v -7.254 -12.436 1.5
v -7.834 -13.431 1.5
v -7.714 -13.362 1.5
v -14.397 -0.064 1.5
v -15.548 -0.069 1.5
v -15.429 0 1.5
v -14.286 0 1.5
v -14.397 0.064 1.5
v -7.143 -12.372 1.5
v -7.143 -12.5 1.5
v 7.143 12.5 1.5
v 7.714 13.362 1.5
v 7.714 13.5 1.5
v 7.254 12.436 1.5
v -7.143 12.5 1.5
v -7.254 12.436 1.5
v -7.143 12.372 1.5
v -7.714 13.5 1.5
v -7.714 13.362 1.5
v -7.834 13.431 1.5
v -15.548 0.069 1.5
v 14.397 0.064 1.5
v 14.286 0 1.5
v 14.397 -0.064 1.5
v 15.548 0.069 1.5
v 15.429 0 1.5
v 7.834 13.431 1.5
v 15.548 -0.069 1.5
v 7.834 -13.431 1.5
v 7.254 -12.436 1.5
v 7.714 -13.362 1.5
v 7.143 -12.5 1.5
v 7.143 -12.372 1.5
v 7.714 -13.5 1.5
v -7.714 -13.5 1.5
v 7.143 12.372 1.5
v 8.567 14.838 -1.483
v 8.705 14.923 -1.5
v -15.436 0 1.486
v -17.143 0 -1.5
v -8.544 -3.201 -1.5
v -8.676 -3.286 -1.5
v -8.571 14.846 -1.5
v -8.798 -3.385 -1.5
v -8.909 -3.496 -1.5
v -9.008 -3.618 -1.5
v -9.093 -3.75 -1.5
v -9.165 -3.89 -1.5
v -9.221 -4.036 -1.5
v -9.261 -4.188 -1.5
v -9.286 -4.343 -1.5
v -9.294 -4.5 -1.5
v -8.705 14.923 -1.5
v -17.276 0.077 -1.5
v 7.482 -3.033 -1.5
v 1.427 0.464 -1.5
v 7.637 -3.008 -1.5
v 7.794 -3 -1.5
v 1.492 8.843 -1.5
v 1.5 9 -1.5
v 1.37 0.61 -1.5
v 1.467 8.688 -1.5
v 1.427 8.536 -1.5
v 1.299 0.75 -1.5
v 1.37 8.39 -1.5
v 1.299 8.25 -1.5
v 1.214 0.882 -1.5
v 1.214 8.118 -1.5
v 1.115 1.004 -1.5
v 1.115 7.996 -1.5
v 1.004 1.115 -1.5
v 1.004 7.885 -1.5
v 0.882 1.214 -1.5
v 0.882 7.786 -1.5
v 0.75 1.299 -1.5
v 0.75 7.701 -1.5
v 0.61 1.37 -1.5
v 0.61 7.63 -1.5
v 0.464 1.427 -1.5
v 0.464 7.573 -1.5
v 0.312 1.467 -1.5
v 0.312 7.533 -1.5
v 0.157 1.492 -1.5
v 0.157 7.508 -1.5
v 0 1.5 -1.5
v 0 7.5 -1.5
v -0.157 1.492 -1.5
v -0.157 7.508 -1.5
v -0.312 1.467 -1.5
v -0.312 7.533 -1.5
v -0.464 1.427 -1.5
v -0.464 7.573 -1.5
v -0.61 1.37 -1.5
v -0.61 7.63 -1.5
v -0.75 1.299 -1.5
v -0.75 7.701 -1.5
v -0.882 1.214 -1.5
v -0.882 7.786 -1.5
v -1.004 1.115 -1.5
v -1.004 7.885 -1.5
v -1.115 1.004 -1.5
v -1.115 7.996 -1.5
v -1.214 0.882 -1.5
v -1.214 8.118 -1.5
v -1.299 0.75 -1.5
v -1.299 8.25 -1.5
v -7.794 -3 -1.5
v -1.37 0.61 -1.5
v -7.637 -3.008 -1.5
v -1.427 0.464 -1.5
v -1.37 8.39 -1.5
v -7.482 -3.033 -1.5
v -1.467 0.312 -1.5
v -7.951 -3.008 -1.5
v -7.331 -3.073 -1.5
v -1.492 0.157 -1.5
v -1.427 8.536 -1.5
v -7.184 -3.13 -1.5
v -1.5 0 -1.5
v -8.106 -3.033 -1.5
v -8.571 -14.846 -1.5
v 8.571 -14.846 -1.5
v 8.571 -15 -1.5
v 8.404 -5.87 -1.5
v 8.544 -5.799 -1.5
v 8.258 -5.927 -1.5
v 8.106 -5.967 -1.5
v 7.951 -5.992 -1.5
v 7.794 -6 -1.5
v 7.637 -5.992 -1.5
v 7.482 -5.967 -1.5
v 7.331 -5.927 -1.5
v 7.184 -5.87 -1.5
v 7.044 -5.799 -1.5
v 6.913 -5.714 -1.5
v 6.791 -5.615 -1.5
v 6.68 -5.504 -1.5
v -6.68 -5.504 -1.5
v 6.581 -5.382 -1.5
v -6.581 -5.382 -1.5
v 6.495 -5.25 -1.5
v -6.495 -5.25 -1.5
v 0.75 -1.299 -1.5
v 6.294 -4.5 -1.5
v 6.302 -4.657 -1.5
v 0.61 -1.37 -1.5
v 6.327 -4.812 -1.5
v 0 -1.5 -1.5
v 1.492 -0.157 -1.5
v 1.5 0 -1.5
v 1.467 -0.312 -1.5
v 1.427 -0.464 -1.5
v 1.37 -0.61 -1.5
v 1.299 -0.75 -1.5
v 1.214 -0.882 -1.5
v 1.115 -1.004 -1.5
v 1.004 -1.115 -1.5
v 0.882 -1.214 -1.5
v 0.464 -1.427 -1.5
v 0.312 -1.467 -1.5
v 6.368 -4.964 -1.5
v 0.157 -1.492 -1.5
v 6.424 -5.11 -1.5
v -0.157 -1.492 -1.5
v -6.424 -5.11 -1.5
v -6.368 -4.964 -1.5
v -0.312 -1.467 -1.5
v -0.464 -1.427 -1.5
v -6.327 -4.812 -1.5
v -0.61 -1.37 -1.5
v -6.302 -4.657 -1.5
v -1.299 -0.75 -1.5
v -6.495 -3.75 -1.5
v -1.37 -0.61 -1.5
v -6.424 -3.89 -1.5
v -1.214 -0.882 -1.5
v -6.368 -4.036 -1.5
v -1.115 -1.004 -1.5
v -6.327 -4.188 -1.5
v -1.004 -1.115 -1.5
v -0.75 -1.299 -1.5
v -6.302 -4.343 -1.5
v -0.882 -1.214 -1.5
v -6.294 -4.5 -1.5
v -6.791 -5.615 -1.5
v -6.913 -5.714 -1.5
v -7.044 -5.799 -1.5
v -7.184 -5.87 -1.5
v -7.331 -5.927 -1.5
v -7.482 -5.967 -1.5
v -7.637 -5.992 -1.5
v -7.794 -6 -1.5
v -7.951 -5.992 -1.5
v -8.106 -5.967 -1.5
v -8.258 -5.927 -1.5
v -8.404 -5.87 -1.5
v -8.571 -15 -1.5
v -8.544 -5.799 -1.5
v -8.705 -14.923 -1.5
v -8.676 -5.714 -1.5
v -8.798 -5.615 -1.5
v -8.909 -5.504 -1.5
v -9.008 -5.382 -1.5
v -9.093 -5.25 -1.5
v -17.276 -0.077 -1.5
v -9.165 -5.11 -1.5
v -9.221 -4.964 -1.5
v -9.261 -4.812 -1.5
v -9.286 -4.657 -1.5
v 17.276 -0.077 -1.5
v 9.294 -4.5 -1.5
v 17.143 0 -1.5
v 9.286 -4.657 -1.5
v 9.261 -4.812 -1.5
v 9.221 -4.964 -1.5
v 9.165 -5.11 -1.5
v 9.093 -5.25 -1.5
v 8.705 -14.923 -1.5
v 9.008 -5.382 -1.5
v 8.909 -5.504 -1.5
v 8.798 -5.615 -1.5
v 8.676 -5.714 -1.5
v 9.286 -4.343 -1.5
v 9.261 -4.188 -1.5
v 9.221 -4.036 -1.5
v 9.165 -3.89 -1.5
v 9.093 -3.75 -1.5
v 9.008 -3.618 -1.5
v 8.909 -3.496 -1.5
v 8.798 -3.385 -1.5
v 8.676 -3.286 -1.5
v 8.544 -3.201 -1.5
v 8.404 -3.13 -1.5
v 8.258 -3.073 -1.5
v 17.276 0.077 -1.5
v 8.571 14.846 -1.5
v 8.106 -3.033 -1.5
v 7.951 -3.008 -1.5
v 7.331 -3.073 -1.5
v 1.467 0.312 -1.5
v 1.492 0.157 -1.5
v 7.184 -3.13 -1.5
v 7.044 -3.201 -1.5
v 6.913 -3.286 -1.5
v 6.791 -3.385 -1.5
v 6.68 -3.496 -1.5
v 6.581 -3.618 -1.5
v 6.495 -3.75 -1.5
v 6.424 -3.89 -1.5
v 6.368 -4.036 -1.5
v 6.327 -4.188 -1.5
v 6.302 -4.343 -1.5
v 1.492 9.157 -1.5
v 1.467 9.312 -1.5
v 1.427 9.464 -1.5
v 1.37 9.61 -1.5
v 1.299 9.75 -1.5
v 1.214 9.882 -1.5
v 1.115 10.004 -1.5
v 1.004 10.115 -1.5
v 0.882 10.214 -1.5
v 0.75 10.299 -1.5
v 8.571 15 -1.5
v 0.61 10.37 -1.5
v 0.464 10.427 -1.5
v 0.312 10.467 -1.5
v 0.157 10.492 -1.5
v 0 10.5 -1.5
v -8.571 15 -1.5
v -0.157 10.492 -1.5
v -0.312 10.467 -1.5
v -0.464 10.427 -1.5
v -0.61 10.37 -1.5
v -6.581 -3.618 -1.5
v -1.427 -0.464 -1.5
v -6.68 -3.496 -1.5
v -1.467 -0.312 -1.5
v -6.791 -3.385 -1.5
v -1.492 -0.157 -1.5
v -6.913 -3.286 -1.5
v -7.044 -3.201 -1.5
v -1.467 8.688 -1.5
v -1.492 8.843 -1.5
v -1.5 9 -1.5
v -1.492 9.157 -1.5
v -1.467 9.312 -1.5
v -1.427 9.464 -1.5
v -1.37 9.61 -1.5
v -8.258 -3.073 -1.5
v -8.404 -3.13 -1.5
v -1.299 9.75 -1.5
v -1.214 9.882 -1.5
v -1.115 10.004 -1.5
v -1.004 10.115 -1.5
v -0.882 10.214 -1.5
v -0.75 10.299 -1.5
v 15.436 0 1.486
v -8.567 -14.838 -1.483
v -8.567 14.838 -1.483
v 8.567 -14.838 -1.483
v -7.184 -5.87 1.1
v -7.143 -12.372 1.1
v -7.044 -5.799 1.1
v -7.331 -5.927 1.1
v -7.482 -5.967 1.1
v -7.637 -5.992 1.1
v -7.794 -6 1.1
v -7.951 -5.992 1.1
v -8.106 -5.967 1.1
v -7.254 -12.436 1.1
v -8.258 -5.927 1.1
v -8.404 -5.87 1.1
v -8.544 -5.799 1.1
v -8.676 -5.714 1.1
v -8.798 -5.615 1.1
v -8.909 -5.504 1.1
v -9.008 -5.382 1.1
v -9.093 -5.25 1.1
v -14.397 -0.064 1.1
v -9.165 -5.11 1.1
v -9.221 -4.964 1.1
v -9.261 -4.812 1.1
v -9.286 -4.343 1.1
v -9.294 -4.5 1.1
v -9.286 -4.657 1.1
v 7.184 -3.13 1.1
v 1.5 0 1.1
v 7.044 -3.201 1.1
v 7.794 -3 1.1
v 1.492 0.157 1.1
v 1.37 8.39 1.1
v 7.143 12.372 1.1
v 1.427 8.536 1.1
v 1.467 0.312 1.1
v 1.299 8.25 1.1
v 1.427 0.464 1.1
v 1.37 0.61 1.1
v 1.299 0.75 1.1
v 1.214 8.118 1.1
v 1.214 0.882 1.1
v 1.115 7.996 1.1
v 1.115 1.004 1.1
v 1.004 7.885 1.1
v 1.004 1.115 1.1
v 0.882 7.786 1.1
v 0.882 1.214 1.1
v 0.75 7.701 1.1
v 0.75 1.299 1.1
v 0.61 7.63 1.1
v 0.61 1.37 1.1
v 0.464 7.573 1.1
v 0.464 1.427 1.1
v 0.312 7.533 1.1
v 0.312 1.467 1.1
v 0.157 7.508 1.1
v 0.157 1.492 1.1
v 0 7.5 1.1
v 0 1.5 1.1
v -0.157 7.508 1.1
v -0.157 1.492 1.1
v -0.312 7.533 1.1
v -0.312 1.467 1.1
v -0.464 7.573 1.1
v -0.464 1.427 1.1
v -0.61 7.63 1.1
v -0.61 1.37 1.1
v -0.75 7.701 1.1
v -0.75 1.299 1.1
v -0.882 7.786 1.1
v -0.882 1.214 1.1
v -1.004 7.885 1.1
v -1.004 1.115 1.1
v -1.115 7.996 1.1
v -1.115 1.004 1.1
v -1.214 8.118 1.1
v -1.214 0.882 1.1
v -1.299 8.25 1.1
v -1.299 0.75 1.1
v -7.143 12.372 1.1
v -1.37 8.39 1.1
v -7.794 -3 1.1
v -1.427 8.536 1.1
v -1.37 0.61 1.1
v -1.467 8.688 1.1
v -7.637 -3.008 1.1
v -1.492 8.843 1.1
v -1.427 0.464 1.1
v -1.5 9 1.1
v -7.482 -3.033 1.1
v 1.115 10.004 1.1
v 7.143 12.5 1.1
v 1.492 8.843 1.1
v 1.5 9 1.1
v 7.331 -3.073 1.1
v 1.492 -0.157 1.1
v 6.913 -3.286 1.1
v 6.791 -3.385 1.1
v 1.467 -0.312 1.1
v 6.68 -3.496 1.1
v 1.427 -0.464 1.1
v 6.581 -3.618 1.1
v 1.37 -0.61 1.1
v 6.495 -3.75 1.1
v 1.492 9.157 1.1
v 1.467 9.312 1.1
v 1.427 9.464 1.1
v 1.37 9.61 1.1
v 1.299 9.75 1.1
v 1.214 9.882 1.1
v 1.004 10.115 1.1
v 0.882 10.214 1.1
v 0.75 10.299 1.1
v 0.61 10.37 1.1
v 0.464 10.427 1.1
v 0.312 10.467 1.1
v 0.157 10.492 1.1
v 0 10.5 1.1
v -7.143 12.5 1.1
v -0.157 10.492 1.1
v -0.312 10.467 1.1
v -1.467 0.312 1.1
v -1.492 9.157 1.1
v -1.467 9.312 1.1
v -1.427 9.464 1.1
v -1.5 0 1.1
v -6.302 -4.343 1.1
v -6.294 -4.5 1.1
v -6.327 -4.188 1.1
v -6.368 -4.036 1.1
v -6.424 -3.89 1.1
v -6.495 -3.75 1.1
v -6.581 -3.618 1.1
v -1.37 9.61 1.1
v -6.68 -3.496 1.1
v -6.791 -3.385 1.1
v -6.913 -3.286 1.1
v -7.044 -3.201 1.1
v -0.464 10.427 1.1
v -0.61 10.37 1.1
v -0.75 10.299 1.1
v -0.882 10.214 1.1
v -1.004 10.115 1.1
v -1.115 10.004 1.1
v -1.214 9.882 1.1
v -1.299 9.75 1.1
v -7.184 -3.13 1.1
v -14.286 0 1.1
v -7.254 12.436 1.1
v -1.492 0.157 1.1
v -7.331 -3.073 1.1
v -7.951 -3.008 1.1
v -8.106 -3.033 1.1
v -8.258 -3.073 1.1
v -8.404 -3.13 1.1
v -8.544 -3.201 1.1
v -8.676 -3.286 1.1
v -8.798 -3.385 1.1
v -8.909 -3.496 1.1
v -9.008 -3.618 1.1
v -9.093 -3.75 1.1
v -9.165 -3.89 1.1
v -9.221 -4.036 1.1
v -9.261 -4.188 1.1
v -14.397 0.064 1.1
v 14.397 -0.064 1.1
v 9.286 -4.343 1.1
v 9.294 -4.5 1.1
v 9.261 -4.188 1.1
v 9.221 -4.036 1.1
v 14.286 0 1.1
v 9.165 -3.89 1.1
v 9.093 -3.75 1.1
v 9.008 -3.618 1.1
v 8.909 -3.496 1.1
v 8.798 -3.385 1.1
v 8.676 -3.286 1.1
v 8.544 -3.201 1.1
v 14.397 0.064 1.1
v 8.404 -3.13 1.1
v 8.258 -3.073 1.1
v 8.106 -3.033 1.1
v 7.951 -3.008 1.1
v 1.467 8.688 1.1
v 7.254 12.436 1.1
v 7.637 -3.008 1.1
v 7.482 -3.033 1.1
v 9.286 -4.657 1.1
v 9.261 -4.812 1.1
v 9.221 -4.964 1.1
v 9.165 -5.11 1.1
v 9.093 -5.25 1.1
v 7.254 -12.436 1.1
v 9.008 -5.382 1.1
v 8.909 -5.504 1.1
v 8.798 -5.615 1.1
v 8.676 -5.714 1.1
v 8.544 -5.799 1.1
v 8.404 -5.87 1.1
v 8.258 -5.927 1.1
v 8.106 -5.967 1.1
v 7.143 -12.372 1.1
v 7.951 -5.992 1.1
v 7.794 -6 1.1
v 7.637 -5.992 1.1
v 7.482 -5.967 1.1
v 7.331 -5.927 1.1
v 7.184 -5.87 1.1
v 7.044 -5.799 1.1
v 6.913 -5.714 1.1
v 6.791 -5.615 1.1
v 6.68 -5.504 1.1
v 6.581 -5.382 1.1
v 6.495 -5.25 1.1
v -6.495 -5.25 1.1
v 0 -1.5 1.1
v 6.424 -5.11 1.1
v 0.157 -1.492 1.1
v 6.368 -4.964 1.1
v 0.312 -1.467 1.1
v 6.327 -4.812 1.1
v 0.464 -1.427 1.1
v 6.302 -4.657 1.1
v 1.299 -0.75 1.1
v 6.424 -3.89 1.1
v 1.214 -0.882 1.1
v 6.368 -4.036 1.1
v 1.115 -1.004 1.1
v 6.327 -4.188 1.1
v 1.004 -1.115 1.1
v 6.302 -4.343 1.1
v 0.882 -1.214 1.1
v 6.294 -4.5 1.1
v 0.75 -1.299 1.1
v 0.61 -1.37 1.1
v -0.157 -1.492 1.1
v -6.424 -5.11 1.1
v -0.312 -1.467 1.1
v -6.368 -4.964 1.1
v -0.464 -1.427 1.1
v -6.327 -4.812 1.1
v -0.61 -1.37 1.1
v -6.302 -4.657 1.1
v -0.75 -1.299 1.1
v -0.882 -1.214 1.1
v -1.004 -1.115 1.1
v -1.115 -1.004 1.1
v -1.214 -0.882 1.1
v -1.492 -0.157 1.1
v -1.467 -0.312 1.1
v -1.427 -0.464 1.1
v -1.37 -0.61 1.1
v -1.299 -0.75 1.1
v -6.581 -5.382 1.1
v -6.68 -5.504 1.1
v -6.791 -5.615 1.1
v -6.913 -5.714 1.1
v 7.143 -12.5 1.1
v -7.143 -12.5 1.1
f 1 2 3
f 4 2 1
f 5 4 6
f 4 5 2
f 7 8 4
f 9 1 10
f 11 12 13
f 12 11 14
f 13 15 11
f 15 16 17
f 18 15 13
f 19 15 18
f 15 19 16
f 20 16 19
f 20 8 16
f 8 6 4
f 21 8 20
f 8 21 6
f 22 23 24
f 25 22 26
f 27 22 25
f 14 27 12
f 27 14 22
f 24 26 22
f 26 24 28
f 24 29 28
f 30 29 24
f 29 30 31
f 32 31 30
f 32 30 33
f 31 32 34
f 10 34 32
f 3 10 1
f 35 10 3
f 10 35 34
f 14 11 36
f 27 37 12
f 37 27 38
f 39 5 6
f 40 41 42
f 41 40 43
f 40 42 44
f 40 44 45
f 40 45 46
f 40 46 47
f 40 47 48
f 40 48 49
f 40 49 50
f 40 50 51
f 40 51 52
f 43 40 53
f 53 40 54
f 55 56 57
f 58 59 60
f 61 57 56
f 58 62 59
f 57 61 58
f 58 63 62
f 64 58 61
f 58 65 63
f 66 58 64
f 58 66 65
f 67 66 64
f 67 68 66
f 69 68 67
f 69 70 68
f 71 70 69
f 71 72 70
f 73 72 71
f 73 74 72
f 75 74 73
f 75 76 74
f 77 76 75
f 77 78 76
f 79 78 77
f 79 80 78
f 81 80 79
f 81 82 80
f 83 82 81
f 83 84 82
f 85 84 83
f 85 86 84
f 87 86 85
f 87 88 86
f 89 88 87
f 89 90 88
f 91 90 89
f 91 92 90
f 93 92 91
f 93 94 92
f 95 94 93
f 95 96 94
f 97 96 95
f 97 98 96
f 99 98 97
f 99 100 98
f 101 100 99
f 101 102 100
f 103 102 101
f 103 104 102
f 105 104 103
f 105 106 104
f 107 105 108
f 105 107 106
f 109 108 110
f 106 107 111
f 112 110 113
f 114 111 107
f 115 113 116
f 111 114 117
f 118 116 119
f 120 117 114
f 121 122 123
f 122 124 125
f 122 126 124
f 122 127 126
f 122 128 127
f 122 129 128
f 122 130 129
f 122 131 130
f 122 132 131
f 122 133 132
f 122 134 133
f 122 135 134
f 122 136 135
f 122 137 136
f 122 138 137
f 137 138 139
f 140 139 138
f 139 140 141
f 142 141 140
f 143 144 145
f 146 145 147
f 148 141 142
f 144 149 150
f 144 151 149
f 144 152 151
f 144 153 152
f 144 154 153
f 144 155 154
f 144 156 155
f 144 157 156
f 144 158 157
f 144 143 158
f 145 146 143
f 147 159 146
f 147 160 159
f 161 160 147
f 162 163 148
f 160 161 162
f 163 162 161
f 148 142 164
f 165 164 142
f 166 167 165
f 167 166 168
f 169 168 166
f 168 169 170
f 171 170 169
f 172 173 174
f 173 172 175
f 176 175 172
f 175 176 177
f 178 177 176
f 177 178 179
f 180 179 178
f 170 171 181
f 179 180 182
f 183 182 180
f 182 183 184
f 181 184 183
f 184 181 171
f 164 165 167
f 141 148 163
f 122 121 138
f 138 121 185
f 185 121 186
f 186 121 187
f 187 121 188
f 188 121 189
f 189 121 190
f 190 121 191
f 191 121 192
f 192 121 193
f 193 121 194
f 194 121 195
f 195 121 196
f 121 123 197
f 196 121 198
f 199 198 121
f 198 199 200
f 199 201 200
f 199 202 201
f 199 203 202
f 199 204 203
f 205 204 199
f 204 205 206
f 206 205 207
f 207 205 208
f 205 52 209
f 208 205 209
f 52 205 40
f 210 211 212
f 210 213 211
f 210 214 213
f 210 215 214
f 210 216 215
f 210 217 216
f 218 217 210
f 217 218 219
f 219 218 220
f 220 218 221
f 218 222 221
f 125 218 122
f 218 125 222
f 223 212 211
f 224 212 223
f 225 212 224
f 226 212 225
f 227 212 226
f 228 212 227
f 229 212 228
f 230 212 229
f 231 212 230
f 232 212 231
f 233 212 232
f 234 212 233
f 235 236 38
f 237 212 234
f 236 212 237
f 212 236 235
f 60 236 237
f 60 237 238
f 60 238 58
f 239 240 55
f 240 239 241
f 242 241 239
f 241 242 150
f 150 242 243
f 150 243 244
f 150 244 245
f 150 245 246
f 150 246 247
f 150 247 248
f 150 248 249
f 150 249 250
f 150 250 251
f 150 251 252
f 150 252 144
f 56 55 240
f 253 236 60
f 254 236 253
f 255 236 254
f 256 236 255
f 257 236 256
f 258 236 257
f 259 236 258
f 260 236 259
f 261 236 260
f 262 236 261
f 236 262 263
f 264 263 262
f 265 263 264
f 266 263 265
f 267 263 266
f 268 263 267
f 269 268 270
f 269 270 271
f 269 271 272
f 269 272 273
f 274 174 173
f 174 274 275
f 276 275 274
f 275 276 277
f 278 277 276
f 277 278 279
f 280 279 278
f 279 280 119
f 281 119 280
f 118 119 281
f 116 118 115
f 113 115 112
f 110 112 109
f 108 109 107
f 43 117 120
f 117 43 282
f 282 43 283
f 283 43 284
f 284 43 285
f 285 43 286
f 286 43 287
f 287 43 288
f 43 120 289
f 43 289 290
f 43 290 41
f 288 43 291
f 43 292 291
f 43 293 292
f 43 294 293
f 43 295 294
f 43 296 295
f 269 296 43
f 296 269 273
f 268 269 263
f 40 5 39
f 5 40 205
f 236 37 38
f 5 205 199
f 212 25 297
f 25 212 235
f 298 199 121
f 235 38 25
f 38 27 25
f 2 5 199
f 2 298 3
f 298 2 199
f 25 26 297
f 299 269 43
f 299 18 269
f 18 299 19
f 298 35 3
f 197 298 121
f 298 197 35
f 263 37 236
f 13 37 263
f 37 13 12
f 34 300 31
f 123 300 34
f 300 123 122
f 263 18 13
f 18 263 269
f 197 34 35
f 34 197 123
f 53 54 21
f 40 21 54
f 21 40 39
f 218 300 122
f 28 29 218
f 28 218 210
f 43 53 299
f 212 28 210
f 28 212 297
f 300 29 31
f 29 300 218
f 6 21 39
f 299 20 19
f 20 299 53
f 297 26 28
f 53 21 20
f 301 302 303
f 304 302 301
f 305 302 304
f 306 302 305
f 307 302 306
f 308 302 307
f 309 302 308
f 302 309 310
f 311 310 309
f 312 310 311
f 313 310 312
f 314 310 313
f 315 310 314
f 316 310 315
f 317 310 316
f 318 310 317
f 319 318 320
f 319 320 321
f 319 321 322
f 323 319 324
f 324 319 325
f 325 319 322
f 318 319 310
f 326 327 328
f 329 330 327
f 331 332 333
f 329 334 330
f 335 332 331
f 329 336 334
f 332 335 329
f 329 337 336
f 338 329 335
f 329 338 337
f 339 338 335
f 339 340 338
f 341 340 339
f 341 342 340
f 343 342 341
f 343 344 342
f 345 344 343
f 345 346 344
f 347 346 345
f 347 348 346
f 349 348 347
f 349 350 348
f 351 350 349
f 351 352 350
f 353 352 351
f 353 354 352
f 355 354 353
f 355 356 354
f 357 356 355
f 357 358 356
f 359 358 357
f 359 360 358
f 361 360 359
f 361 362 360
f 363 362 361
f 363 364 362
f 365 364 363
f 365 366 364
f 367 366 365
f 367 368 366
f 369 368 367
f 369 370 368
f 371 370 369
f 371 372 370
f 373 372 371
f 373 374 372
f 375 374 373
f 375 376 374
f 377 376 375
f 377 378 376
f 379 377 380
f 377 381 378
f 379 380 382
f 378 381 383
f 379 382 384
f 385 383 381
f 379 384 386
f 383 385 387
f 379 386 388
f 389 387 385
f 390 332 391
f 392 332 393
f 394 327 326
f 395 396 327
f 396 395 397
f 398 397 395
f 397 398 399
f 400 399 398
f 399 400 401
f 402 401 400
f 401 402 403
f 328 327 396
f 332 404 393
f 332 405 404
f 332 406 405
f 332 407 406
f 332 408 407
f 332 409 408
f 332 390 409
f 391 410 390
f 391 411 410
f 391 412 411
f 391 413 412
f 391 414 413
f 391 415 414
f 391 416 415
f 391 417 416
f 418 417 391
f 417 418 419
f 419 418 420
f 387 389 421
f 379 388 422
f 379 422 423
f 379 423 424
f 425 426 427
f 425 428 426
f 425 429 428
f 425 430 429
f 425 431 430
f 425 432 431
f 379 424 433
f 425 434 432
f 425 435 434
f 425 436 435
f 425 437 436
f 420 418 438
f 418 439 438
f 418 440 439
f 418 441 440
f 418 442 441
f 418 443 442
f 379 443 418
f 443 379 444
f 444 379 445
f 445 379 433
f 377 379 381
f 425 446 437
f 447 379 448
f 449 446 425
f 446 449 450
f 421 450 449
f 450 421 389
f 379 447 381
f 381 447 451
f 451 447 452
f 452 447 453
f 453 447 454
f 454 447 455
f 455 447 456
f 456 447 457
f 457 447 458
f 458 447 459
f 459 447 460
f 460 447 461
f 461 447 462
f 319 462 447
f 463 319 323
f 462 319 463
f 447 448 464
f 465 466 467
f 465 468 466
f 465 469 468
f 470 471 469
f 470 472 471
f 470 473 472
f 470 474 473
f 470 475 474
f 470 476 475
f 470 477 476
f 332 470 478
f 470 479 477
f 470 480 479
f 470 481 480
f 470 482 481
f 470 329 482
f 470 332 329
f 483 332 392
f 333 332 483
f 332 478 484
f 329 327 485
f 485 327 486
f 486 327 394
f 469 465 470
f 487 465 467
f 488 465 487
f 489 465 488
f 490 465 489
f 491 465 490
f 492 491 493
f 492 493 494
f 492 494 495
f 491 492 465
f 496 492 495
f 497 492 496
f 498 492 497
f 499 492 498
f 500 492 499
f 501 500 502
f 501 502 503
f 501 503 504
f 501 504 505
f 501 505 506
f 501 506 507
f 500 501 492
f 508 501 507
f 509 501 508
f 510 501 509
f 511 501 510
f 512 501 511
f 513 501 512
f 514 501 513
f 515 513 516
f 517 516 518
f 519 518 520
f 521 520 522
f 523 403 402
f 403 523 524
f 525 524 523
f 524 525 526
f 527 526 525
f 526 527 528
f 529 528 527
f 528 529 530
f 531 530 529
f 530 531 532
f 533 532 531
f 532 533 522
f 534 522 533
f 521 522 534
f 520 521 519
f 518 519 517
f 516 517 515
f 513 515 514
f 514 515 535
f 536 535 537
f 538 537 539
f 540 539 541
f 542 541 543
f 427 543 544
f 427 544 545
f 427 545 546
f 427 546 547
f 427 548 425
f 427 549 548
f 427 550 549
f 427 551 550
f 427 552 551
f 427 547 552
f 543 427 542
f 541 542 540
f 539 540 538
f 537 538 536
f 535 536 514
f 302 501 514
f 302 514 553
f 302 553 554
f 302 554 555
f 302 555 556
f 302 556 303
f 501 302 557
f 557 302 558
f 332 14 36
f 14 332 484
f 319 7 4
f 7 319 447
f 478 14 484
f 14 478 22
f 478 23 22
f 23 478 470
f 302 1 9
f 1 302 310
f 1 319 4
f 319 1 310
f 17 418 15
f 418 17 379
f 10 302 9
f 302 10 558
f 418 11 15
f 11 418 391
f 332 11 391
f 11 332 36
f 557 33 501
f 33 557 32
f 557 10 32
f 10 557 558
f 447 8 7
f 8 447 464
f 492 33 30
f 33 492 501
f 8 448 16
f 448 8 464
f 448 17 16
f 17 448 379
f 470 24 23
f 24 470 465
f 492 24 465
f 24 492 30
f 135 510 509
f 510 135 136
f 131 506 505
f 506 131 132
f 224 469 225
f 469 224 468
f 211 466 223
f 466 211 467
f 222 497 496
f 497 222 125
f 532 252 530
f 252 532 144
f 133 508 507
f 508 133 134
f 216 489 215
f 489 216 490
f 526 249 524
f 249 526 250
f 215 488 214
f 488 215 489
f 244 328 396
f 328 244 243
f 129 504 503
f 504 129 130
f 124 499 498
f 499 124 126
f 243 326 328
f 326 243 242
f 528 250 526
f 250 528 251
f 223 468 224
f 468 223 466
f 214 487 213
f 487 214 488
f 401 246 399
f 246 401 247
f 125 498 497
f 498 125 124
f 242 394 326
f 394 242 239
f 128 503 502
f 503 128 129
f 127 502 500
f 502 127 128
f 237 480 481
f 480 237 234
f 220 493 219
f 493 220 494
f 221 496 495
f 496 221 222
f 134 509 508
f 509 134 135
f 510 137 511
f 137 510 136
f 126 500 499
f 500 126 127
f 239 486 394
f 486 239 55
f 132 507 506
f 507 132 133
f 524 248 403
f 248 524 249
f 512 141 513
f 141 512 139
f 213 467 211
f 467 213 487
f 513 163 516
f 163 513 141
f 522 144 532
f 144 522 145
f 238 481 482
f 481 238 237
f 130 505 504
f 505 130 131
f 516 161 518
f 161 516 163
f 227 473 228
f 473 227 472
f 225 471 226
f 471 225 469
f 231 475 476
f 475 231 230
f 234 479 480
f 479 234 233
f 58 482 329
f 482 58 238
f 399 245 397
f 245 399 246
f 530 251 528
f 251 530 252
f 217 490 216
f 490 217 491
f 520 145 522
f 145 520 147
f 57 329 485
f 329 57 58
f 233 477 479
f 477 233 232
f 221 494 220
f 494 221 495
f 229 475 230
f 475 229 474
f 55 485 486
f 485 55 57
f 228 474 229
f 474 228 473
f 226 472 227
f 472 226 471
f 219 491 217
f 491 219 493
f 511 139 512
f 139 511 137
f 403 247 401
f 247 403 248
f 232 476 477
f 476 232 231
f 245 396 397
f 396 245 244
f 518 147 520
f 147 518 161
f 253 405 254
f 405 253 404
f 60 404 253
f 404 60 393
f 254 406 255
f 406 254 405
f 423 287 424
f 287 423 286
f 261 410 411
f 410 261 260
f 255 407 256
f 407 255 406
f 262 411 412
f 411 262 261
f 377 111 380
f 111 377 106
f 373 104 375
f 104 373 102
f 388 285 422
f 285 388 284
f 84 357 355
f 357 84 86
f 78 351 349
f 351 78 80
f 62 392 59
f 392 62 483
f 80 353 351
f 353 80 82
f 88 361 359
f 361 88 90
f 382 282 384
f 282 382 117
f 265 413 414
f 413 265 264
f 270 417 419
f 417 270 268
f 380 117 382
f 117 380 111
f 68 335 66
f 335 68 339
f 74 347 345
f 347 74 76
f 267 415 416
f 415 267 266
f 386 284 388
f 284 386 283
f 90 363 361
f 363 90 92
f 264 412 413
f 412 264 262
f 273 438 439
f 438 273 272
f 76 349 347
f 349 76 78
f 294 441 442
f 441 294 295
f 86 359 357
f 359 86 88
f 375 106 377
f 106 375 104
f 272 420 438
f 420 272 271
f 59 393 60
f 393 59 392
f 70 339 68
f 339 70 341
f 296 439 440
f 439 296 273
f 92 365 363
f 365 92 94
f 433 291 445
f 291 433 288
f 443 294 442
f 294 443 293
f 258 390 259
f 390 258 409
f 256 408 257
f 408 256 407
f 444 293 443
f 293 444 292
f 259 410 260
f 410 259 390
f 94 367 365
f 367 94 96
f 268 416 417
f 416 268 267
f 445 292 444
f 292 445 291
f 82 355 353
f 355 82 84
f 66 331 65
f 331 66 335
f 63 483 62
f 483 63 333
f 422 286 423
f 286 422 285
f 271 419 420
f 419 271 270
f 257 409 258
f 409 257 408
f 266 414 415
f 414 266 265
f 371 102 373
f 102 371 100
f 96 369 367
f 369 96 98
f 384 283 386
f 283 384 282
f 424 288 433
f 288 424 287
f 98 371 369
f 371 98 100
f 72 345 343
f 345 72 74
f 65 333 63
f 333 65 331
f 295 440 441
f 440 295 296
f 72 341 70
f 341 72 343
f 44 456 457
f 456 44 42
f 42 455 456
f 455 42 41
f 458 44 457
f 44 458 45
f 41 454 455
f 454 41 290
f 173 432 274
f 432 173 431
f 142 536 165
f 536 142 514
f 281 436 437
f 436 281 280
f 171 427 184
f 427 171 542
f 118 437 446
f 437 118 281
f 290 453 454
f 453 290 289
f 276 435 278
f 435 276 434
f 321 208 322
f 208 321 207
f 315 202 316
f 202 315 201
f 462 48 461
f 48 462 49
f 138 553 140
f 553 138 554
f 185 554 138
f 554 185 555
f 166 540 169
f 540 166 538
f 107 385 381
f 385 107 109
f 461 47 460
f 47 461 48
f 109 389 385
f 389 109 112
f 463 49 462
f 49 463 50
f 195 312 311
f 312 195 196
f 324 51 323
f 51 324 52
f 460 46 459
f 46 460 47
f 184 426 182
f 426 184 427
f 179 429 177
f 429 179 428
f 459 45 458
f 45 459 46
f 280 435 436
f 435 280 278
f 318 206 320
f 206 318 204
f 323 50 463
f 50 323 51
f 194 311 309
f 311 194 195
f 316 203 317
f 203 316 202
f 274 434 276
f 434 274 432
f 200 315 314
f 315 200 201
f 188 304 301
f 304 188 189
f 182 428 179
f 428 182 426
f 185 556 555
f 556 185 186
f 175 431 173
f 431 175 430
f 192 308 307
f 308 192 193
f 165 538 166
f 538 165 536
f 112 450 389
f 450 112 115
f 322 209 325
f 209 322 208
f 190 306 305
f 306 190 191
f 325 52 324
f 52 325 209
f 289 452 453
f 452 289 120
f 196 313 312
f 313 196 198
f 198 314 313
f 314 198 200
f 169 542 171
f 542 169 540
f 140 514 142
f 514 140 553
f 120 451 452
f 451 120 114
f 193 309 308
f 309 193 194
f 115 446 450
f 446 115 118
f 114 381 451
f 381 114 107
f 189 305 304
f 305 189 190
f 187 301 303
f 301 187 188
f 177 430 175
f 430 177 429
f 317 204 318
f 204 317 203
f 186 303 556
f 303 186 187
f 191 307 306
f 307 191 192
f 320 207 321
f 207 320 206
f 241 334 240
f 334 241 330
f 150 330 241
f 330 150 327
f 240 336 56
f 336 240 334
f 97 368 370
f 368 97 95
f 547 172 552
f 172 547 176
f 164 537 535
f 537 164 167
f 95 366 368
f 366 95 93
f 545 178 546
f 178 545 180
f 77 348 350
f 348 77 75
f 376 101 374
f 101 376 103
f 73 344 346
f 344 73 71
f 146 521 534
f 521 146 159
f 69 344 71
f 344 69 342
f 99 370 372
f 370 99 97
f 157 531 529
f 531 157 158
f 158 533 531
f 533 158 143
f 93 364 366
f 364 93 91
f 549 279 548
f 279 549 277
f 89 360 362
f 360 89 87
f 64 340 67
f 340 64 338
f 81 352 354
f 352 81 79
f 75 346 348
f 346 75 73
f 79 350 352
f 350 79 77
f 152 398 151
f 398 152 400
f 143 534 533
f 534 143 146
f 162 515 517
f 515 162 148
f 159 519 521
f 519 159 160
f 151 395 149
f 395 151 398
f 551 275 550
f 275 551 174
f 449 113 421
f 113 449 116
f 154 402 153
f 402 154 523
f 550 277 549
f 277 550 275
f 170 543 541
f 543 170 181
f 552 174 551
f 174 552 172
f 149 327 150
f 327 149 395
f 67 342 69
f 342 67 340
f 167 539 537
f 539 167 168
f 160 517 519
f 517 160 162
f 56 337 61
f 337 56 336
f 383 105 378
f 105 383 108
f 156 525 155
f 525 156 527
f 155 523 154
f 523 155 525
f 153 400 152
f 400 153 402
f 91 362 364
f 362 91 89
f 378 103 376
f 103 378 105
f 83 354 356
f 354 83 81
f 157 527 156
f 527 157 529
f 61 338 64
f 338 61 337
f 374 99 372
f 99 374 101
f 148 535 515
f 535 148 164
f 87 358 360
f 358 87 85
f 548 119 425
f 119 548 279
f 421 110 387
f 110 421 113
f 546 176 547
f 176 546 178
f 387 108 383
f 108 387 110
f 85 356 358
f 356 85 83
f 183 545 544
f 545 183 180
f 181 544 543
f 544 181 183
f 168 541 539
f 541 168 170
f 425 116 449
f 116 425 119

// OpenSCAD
$fn=60 * 1;

// Outer hex width 
_hexOuterWidth = 30;

// Inner hex width
_hexInnerWidth = 25;

// The hex height
_hexHeight = 3;

// The depth of the inset
_hexInnerDepth = 0.5;

// The slope of the hex sides
_hexOuterSlope = 0.9;

// Adds curves to the corners
_hexOuterAngleRadius = 0;

// The radius of the magent whole in the center (0 to disable)
_hexMagRadCenter = 1.5;

// The depth of the magnet hole (0 will cut through)
_hexMagDepth = 0;

// The radius of the magent whole(s) along the edge  (0 to disable)
_hexMagRadEdge = 1.5;

// How far are the magnets positioned from center.
_hexMagEdgeDistance = 9;

// Align the magnets with the corners or the edges
_hexMagPos = "Edge";   //[Edge,Corner]

// Put a magnet at every interval or every other (6 magnets for all, 3 for every other)
_hexMagFreq  = "EveryOther";  //[EveryOther,All]

// Hidden variables
//_hexInnerWidth = _hexOuterWidth * 0.85;   // multiplier ... 40=34, 20=17
//_hexMagEdgeDistance = (_hexInnerWidth/3);
_hexMagEdgeDistance2 = (_hexInnerWidth/2)-_hexMagRadEdge-0.1;           // distance #2 is tricky .... logic in loop
//_hexMagEdgeDistance2 = 0;


_rotHalf1 = []; _rotHalf2 = [];

_rotHalf1 = (_hexMagPos == "Edge" && _hexMagFreq=="All" ? [-120, -60, 0, 60, 120, 180]
    : (_hexMagPos == "Edge" && _hexMagFreq=="EveryOther" ? [-120, 0, 120]        
        : (_hexMagPos == "Corner" && _hexMagFreq=="EveryOther" ? [-150, 90, -30]
            : (_hexMagPos == "Corner" && _hexMagFreq=="All" ? [-150, -90, -30, 30, 90, 150]
                : [])
            )
        )    
    );
    

hexagonBase(
    _hexHeight, _hexOuterWidth, _hexOuterSlope, _hexOuterAngleRadius, 
    _hexInnerWidth, _hexInnerDepth, 
    _hexMagRadCenter, _hexMagRadEdge, _hexMagEdgeDistance, _hexMagEdgeDistance2, 
    _rotHalf1, _rotHalf2);




module hexagonBase(hexHeight, hexOuterWidth, hexOuterSlope, hexOuterAngleRadius, 
    hexInnerWidth, hexInnerDepth,
    hexMagRadCenter, hexMagRadEdge, hexMagEdgeDistance, hexMagEdgeDistance2, rotHalf1, rotHalf2) {
        
    depth = (hexOuterAngleRadius != 0 ? hexHeight - hexInnerDepth - 0.4 : hexHeight - hexInnerDepth + 0.1);
                        
    difference() 
    {
        // the part to add
        union(){
            hexagon(hexOuterWidth,hexHeight,hexOuterAngleRadius,hexOuterSlope);
            //hexagonSimple(40,4);
        }
      
        // the part to remove
        union(){
            // remove inner hex
            if(hexOuterAngleRadius != 0) {                
                //depth = hexHeight - hexInnerDepth - 0.4;    // -0.4 offset ... dunno
                if(depth <= 0) {
                    translate([0, 0, -1]) hexagonSimple(hexInnerWidth,hexHeight+3);
                } else {
                    translate([0, 0, depth]) hexagonSimple(hexInnerWidth,hexHeight);
                }
                
            } else {
                //depth = hexHeight - hexInnerDepth + 0.1;
                if(depth <= 0) {
                    translate([0, 0, -1]) hexagonSimple(hexInnerWidth,hexHeight+3);
                } else {
                    translate([0, 0, depth]) hexagonSimple(hexInnerWidth,hexHeight);
                }
            }
            
            if(depth > 0) {
                // remove center magnet hole
                if(hexMagRadCenter != 0) {
                    if(_hexMagDepth == 0) {
                        #cylinder(r=hexMagRadCenter,h=hexHeight+2,center=true);      // # will show the "ghost shape"
                    } else {
                        //translate([0, 0, _hexHeight-_hexMagDepth])
                        //    #cylinder(r=hexMagRadCenter,h=hexHeight+_hexMagDepth,center=true);      // # will show the "ghost shape"
                        translate([0, 0, _hexHeight-_hexMagDepth])
                            #cylinder(r=hexMagRadCenter,h=hexHeight,center=true);      // # will show the "ghost shape"
                    }
                }
                
                
                if(hexMagRadEdge != 0) {
                    
                    // remove edge wholes (center of edge)
                    for (r = rotHalf1) {   
                        rotate([0,0,r])
                        //translate([0, (hexInnerWidth/2)-hexMagRadEdge-0.1, 0])    // =7 if 20, =14 if 40
                        if(_hexMagDepth == 0) {
                            translate([0, hexMagEdgeDistance, 0])
                                #cylinder(r=hexMagRadEdge,h=hexHeight+2,center=true);  // # will show the "ghost shape"
                        } else {
                            translate([0, hexMagEdgeDistance, _hexHeight-_hexMagDepth])
                                #cylinder(r=hexMagRadEdge,h=hexHeight,center=true);  // # will show the "ghost shape"
                        }
                    }
                        
                    // remove edge wholes (center of edge)
                    for (r = rotHalf2) {   
                        rotate([0,0,r])
                        
                        if(_hexMagDepth == 0) {
                            //translate([0, (hexInnerWidth/2)-hexMagRadEdge-0.1, 0])    // =7 if 20, =14 if 40
                            translate([0, hexMagEdgeDistance2, 0])
                                #cylinder(r=hexMagRadEdge,h=hexHeight+2,center=true);  // # will show the "ghost shape"
                        } else {
                            translate([0, hexMagEdgeDistance2, _hexHeight-_hexMagDepth])
                                #cylinder(r=hexMagRadEdge,h=hexHeight,center=true);  // # will show the "ghost shape"
                        }
                    }                
                }
            }
        }    
    }   
}  


module hexagonSimple(size, height) {
    
    boxWidth = size/1.75;
    for (r = [-60, 0, 60]) {  
        rotate([0,0,r]) 
        //cube([boxWidth, size, height], true);
        linear_extrude(height, scale=1, center = true) square([boxWidth,size], center = true);
    }
}
module hexagon(size, height, radius, slope) {
// Hexagon with beveled corners and sloped edges
//    NOTE: Sizing issue when roundnig corners
    
    // adjust actual size based on cylinder radius used for corner bevel
    size = size - radius*2;
    
    // set boxWidth used for hex creation
    boxWidth = size/1.75;
        
    for (r = [-60, 0, 60]) {   
        rotate([0,0,r]) 
            
        if(radius != 0) {
 
            // FIX: height
            height = height-1;        // -1 offset ... not sure why (cylinder ?)

            // FIX: looses z center
            translate([0, 0, -1])     // -1 offset ... not sure why (cylinder ?)
            
            // slope edges and bevel corners
            minkowski() {    
                linear_extrude(height, scale=slope, center = true) square([boxWidth,size], center = true);
                cylinder(r=radius, true); // not sure why this creates a non-sloped bottom segment... ?
            }
        } else {
            // slope edges
            linear_extrude(height, scale=slope, center = true) square([boxWidth,size], center = true);
        }
           
    }
}
